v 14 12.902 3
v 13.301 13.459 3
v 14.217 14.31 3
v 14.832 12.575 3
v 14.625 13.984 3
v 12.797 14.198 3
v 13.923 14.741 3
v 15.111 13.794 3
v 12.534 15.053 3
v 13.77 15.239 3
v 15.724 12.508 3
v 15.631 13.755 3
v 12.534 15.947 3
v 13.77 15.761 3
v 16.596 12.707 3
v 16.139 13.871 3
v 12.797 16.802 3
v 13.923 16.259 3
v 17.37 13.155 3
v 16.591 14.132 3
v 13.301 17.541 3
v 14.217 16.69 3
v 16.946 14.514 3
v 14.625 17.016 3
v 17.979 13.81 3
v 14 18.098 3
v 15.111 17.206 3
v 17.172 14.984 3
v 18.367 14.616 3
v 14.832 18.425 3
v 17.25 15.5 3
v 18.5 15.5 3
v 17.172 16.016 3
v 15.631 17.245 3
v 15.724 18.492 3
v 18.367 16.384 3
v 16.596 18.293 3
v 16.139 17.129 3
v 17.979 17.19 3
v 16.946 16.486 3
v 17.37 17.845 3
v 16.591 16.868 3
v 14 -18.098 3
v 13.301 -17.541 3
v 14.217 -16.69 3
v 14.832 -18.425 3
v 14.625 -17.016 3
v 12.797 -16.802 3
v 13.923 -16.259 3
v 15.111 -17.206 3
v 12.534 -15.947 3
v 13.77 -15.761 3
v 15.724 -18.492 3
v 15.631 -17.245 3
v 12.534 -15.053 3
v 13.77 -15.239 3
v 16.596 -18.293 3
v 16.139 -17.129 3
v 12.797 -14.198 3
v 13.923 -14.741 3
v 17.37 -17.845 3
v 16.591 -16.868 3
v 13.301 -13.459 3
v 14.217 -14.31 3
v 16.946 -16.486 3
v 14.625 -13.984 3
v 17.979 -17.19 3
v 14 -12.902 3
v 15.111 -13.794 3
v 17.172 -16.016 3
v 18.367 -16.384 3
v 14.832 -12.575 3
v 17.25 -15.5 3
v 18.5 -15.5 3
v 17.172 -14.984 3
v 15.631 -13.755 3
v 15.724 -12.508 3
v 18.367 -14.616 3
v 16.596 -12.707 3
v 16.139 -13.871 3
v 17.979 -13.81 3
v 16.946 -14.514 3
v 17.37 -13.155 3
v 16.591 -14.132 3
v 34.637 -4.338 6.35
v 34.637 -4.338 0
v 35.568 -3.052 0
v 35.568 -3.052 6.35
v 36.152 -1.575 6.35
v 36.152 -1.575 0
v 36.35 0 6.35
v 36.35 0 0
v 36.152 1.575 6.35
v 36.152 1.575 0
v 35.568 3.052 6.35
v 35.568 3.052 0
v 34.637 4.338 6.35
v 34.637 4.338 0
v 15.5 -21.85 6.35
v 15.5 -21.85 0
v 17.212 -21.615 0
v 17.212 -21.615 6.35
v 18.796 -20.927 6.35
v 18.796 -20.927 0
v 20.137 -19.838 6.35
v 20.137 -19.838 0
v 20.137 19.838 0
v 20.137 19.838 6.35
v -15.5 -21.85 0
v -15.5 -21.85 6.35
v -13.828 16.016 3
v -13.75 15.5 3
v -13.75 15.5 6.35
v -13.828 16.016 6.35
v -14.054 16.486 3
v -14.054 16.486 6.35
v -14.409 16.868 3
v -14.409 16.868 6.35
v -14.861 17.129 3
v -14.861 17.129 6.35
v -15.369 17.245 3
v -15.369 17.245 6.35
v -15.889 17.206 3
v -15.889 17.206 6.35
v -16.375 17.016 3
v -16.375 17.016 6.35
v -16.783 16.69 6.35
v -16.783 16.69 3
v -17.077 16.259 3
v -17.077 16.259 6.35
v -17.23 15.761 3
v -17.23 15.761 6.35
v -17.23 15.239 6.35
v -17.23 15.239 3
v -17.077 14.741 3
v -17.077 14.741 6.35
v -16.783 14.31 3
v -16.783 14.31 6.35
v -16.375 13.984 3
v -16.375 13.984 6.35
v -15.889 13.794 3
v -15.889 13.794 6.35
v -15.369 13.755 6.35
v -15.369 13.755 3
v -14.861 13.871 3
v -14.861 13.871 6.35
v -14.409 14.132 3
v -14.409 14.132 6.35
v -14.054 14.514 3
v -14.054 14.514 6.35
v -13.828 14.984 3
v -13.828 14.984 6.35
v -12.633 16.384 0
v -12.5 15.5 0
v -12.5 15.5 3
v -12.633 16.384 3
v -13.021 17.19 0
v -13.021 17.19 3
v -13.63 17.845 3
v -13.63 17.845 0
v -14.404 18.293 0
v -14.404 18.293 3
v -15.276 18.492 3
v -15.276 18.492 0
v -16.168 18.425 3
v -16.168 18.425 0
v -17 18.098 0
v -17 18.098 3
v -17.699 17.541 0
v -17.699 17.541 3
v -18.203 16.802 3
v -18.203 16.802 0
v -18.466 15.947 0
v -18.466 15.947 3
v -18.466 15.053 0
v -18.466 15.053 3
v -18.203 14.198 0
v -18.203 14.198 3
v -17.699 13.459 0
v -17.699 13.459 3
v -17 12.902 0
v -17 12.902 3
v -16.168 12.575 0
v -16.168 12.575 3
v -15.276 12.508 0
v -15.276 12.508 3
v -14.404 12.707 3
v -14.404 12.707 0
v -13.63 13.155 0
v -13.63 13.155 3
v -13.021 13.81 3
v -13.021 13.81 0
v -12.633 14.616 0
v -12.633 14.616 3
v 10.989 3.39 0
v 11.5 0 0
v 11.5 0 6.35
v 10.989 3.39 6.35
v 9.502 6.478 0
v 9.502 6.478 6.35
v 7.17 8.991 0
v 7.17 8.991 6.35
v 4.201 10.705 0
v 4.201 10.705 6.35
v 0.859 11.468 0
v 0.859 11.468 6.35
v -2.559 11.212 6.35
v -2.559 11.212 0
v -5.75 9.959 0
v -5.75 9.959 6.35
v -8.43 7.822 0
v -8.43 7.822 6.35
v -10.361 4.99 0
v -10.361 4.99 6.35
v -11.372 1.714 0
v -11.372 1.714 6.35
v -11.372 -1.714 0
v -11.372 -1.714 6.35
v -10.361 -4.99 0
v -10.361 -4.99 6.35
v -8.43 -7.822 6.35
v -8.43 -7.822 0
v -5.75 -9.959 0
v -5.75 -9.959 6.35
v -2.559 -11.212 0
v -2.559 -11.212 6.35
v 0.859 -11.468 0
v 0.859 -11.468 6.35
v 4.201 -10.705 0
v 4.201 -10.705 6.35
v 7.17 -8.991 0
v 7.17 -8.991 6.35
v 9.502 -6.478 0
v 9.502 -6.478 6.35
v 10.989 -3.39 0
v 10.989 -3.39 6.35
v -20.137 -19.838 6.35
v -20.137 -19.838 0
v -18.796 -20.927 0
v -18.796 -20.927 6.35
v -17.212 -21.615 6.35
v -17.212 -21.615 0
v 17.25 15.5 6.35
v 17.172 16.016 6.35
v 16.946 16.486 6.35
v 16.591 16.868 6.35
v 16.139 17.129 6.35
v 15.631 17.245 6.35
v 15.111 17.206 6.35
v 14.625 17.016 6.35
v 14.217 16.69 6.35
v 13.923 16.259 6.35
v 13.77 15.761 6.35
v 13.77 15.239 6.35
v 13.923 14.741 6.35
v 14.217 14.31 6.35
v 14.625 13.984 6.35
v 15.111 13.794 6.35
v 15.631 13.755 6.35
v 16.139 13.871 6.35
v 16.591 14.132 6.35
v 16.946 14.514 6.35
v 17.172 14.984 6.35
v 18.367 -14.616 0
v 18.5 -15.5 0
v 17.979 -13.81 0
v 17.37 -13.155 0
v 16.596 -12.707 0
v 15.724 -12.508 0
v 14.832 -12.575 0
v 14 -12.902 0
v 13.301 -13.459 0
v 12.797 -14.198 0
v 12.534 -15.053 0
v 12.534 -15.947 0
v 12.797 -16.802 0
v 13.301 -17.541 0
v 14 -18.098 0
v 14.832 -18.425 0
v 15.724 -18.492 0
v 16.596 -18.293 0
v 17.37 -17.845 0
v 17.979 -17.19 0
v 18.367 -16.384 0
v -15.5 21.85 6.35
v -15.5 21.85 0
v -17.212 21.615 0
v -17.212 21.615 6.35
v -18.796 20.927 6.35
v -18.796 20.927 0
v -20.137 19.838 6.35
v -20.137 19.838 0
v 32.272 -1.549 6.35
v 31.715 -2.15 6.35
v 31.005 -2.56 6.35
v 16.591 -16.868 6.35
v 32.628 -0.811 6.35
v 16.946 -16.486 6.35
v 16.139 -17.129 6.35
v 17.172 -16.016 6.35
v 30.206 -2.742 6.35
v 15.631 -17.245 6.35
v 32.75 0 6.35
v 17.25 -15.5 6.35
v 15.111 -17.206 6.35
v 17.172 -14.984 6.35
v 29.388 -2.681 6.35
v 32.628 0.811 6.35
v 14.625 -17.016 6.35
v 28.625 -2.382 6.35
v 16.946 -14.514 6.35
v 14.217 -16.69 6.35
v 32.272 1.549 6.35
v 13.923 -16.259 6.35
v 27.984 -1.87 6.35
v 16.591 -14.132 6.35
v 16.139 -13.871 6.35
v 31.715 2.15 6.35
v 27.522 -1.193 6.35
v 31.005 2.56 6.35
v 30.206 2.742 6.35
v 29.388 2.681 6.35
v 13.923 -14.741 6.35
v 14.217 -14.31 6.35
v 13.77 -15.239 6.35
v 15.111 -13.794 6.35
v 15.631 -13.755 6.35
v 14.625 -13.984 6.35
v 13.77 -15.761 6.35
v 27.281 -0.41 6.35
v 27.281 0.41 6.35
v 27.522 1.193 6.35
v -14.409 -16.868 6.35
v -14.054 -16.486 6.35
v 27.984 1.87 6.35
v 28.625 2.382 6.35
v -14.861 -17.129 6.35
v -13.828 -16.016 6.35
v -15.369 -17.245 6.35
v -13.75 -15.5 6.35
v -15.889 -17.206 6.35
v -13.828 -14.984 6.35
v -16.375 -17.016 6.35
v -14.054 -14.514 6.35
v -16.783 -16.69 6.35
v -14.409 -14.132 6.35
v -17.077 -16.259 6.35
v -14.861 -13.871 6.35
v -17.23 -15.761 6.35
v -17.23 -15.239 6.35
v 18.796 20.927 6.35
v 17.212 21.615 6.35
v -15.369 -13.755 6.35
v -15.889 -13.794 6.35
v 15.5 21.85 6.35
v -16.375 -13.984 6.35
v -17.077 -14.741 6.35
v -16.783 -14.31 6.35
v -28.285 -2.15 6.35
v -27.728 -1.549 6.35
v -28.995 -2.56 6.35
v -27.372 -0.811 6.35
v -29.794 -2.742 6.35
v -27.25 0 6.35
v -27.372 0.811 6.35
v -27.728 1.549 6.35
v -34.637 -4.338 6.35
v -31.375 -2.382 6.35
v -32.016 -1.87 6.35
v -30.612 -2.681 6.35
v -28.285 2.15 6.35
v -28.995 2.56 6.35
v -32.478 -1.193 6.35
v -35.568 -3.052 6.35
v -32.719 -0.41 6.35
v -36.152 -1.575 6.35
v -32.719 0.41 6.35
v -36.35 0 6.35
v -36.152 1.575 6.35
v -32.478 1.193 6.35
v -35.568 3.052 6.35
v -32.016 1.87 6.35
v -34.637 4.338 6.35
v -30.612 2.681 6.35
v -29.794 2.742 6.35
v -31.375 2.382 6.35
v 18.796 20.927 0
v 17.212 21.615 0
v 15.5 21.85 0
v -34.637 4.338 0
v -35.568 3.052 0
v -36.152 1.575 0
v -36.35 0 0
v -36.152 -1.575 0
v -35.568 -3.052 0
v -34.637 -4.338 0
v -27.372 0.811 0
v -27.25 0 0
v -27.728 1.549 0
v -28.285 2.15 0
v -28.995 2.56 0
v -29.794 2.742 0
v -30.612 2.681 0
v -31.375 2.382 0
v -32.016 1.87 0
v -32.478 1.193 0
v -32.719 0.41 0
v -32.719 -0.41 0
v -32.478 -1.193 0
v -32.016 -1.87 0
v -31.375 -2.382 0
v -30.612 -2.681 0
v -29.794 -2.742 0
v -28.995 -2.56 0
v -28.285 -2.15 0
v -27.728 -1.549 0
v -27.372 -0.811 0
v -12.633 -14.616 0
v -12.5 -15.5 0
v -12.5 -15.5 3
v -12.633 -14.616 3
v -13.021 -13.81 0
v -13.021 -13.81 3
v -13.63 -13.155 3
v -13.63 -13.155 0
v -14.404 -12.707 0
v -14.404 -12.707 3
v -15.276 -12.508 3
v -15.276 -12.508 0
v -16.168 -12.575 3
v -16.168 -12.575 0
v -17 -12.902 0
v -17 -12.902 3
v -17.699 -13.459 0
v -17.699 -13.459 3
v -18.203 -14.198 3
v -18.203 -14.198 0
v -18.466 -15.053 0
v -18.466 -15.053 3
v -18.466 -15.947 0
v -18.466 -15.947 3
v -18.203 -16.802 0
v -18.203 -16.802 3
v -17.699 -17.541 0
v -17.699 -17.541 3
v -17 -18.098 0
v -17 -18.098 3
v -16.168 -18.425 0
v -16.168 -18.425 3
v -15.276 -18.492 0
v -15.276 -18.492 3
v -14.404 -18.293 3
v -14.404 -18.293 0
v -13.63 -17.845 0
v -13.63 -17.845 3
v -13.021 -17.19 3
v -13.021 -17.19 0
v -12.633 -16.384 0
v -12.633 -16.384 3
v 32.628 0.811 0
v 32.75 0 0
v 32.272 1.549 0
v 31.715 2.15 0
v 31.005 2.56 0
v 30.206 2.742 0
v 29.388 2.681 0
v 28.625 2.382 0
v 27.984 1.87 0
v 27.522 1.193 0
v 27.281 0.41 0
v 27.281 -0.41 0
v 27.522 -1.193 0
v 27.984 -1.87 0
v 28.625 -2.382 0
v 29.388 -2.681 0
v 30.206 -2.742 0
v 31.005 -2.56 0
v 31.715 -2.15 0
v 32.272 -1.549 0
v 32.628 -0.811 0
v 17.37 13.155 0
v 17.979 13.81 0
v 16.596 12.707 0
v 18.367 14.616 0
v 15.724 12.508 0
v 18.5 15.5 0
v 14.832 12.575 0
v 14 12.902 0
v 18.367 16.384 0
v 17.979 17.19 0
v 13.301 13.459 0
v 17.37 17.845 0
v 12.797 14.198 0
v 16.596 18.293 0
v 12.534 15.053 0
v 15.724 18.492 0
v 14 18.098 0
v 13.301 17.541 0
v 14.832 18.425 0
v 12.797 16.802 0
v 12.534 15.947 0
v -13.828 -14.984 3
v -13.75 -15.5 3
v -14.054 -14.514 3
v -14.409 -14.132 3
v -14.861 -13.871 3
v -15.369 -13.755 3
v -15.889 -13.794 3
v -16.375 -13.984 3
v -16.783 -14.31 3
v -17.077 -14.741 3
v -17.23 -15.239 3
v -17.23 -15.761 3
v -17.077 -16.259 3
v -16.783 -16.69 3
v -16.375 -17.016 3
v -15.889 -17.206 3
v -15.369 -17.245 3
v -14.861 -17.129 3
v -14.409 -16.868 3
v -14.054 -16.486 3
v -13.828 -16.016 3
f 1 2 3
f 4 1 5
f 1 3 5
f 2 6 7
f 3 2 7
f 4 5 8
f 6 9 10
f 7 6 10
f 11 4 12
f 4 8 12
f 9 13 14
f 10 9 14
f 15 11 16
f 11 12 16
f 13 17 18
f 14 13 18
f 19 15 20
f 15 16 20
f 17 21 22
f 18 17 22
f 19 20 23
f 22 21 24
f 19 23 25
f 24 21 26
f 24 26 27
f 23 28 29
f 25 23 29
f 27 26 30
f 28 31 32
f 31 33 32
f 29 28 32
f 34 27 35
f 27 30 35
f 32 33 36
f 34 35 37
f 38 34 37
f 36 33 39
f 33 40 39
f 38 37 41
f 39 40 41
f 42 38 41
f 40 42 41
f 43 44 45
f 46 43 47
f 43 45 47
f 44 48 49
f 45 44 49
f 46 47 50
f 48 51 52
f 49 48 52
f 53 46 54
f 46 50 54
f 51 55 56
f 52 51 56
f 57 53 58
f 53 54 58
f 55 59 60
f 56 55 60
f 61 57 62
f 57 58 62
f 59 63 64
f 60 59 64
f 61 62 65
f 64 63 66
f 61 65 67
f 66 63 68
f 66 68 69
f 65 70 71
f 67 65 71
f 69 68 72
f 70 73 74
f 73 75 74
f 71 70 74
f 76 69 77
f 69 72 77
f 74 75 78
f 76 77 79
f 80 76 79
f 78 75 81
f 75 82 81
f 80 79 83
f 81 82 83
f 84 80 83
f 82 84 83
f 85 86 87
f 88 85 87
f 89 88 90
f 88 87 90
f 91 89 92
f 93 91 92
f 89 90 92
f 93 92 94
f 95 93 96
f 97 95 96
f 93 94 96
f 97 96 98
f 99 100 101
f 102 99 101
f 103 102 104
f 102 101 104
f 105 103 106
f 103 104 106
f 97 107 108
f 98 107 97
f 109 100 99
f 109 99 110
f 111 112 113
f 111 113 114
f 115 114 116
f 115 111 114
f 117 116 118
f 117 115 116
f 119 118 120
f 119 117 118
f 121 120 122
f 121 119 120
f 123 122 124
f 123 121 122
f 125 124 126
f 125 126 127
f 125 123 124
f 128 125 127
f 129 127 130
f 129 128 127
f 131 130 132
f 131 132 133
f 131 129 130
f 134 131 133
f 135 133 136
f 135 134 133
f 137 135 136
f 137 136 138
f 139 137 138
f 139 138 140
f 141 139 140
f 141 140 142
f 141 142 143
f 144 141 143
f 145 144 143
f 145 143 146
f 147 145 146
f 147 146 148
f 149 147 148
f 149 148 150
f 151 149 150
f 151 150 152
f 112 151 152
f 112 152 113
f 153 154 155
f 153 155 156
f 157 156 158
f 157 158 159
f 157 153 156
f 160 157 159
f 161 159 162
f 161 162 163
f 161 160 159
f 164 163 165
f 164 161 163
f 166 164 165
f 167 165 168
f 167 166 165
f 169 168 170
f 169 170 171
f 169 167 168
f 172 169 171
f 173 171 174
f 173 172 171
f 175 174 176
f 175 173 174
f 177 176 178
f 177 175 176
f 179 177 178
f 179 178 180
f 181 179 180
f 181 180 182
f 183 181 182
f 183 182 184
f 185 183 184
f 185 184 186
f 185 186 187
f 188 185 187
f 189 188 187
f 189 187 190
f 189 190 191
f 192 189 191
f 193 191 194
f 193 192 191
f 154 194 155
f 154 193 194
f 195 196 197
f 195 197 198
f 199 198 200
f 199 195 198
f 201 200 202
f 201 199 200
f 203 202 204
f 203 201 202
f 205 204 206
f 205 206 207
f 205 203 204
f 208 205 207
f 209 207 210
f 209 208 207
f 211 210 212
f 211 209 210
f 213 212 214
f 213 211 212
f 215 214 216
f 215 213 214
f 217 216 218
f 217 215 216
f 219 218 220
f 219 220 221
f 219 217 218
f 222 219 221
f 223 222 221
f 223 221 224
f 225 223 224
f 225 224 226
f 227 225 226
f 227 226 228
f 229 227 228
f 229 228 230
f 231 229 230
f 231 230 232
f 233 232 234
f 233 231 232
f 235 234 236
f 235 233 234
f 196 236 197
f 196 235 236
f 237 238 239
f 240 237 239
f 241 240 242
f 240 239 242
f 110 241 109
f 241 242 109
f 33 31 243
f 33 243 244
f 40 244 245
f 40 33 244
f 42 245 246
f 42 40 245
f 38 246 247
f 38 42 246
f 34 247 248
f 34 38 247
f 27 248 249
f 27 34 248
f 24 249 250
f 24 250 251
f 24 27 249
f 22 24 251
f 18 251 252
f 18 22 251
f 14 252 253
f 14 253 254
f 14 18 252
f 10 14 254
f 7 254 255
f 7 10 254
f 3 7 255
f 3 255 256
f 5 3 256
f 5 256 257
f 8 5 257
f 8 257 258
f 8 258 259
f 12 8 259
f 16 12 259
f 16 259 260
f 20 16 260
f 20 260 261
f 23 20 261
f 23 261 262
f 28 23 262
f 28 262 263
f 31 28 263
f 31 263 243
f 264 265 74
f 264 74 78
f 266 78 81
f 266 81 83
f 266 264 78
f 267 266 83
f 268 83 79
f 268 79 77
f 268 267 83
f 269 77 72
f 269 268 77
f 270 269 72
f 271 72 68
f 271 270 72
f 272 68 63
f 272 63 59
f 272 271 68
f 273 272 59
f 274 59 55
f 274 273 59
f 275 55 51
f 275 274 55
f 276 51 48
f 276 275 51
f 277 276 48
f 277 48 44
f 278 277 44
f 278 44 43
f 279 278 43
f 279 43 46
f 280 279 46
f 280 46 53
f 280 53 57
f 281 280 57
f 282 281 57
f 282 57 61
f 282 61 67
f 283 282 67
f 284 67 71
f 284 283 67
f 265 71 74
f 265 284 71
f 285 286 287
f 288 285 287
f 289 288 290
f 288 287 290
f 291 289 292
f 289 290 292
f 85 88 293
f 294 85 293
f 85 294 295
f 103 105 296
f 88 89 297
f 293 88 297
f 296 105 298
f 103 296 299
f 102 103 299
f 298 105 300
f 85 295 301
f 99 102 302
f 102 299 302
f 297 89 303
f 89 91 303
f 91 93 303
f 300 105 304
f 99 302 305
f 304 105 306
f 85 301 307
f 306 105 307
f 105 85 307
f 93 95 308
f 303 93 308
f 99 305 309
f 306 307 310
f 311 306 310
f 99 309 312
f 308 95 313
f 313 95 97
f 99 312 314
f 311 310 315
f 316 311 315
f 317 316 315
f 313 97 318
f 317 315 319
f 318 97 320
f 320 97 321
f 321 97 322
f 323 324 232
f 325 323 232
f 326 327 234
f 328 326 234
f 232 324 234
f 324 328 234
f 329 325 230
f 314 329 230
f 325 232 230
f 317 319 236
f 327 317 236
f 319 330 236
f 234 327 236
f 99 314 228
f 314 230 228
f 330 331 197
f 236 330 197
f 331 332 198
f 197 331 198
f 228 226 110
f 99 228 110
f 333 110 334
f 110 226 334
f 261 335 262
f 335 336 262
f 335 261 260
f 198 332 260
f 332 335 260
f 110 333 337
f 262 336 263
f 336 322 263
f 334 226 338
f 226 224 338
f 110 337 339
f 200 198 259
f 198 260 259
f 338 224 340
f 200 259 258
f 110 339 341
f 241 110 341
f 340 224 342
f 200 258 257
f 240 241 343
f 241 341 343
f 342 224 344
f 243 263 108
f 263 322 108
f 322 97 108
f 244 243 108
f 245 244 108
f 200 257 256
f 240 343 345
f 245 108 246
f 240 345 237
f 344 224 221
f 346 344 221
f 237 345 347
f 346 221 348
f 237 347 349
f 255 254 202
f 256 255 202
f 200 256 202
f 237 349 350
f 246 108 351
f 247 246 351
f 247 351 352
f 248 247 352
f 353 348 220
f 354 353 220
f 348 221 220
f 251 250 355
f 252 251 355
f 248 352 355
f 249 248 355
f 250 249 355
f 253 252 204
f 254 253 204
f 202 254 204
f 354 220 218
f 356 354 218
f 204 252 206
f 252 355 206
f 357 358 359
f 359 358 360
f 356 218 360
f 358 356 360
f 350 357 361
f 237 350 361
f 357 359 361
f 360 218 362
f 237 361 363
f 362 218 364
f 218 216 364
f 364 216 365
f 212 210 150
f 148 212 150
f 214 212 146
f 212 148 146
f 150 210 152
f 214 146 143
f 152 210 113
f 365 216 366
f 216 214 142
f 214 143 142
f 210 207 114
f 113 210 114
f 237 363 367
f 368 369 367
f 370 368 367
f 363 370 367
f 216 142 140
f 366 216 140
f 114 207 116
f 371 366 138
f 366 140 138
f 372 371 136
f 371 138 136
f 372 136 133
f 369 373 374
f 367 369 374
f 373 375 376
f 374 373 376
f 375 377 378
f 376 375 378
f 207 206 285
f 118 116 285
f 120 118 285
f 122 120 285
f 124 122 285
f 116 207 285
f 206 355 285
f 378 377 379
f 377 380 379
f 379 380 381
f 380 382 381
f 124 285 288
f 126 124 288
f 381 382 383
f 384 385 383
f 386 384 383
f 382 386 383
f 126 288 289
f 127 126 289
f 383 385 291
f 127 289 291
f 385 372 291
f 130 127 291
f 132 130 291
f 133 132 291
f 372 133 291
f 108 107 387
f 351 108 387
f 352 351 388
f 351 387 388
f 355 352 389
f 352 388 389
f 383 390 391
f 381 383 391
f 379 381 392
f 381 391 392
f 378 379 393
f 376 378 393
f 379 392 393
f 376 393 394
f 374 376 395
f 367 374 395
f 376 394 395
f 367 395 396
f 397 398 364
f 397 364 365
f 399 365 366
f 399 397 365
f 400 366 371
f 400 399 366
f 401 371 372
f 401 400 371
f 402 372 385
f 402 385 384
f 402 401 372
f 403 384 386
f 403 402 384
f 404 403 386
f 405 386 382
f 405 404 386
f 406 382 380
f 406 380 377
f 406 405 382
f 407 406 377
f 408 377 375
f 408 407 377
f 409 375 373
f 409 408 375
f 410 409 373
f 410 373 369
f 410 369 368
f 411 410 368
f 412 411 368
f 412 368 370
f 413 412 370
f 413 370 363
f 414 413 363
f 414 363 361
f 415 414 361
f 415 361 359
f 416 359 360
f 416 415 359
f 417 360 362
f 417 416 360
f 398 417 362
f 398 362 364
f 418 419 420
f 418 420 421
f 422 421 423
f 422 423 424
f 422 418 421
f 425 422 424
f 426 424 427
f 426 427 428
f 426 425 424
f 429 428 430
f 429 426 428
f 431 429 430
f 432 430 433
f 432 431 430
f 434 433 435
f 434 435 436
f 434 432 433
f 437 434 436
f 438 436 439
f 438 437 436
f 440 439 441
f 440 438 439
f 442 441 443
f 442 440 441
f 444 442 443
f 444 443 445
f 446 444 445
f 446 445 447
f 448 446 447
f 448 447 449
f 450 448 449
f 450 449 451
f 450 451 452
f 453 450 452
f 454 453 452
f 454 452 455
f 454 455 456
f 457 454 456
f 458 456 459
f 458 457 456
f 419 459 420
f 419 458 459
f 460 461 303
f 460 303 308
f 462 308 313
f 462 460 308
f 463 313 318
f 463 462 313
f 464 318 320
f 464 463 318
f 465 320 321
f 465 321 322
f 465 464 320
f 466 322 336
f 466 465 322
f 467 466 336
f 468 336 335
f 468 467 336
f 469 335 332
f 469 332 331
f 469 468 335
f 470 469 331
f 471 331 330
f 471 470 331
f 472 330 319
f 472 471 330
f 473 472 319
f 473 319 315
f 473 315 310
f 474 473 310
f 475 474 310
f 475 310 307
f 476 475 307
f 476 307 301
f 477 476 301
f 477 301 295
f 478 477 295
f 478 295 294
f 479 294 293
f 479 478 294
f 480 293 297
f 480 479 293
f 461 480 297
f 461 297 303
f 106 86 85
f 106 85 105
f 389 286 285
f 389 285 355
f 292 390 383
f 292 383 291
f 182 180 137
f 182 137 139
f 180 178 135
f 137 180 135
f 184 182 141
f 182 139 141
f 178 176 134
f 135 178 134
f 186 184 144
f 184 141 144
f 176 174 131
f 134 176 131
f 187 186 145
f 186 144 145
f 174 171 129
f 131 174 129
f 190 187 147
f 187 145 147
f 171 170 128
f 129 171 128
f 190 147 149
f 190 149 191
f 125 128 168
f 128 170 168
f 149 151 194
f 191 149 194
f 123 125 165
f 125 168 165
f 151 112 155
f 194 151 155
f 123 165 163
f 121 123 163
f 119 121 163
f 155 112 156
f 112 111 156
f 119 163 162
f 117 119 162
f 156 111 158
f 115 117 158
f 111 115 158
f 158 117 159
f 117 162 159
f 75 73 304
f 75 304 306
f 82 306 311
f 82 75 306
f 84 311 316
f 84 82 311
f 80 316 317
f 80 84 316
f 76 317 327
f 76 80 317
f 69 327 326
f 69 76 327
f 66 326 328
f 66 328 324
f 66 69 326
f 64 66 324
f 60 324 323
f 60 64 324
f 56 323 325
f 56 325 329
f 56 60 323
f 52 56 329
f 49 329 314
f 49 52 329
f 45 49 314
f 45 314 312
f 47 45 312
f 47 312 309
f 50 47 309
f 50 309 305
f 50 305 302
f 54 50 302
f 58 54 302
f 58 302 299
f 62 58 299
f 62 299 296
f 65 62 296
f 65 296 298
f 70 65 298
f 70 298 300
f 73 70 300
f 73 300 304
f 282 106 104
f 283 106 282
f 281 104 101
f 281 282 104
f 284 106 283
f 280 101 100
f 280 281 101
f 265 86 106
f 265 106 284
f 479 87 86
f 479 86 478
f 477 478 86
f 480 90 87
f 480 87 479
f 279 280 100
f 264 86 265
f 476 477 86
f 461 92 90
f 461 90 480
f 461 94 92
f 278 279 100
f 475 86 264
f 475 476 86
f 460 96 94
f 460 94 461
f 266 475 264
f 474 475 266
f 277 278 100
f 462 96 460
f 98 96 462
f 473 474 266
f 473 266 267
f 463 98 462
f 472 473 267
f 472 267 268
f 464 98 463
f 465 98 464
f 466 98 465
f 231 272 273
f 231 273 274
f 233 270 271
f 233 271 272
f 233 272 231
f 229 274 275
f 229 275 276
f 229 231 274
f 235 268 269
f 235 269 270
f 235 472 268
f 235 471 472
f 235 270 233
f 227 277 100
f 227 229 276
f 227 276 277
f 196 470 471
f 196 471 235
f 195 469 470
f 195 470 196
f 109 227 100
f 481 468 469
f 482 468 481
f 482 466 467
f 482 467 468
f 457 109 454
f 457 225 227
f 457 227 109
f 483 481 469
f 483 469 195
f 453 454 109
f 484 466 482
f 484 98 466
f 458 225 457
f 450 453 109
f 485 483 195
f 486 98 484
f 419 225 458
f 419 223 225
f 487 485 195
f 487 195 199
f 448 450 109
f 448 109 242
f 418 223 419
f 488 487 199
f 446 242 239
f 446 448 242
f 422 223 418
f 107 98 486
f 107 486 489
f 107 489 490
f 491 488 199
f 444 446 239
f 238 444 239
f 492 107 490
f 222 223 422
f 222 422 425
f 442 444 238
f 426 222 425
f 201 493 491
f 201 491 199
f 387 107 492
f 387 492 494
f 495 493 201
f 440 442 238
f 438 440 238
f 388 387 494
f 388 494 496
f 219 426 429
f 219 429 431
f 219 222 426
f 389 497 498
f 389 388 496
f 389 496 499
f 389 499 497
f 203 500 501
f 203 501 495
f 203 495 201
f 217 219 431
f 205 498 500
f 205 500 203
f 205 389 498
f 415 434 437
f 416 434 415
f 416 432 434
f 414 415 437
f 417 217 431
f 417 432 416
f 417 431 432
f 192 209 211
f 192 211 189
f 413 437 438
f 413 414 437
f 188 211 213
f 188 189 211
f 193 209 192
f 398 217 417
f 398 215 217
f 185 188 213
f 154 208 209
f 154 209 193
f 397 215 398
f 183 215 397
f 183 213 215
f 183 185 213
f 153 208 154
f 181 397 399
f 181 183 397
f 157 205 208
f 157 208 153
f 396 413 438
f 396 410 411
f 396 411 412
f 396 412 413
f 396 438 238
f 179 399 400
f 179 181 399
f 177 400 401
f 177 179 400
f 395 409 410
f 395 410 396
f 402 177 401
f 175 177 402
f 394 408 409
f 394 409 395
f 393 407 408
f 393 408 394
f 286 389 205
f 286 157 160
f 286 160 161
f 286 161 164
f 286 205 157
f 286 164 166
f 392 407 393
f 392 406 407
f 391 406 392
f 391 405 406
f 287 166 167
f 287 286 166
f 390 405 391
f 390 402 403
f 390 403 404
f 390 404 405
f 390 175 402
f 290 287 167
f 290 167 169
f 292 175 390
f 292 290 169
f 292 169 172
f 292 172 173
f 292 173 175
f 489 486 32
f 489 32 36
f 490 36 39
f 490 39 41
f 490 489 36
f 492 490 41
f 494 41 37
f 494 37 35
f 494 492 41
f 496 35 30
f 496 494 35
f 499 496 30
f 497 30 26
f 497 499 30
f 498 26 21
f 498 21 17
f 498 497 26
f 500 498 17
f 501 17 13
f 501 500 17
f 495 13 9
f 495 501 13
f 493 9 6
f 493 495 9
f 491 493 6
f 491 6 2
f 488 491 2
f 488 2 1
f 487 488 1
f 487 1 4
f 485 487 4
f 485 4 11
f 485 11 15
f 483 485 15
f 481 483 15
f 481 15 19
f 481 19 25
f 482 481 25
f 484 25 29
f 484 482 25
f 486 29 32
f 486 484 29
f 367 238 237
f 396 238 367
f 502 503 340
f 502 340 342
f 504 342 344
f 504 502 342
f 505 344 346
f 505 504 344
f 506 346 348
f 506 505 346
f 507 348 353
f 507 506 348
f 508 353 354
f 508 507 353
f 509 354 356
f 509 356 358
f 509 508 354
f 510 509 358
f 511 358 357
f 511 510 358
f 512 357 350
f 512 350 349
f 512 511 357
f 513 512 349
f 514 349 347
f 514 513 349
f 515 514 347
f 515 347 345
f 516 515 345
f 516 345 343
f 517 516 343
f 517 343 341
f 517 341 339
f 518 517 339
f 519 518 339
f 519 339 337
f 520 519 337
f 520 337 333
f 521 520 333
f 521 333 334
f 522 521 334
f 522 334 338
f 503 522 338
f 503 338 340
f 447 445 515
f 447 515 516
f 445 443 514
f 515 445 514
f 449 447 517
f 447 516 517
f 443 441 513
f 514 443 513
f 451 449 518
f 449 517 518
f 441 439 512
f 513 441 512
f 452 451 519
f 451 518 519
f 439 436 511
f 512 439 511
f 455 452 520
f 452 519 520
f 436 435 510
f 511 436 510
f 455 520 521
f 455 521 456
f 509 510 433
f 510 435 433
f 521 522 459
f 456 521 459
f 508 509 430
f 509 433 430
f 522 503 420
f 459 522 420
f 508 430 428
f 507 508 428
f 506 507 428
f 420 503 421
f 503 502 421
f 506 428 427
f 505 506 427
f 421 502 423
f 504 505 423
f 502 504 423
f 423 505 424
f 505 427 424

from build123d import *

# Parameters (mm, degrees)
SKETCH093_R     = 1.75
SKETCH093_R_2   = 2.75
SKETCH093_R_3   = 11.5
PAD032_DEPTH    = 6.35
SKETCH094_R     = 3
POCKET027_DEPTH = 3


with BuildPart() as part:
    # Sketch093 → Pad032 (new body)
    with BuildSketch(Plane.XY):
        with BuildLine():
            Line((-34.637223, 4.338048), (-20.137223, 19.838048))
            ThreePointArc((-15.5, 21.85), (-18.027439, 21.325337), (-20.137223, 19.838048))
            Line((-15.5, 21.85), (15.5, 21.85))
            ThreePointArc((20.137223, 19.838048), (18.027439, 21.325337), (15.5, 21.85))
            Line((20.137223, 19.838048), (34.637223, 4.338048))
            ThreePointArc((34.637223, -4.338048), (36.35, 0), (34.637223, 4.338048))
            Line((34.637223, -4.338048), (20.137223, -19.838048))
            ThreePointArc((15.5, -21.85), (18.027439, -21.325337), (20.137223, -19.838048))
            Line((15.5, -21.85), (-15.5, -21.85))
            ThreePointArc((-20.137223, -19.838048), (-18.027439, -21.325337), (-15.5, -21.85))
            Line((-20.137223, -19.838048), (-34.637223, -4.338048))
            ThreePointArc((-34.637223, 4.338048), (-36.35, 0), (-34.637223, -4.338048))
        make_face()
        with Locations((-15.5, 15.5)):
            Circle(SKETCH093_R, mode=Mode.SUBTRACT)
        with Locations((15.5, 15.5)):
            Circle(SKETCH093_R, mode=Mode.SUBTRACT)
        with Locations((15.5, -15.5)):
            Circle(SKETCH093_R, mode=Mode.SUBTRACT)
        with Locations((-15.5, -15.5)):
            Circle(SKETCH093_R, mode=Mode.SUBTRACT)
        with Locations((-30, 0)):
            Circle(SKETCH093_R_2, mode=Mode.SUBTRACT)
        with Locations((30, 0)):
            Circle(SKETCH093_R_2, mode=Mode.SUBTRACT)
        Circle(SKETCH093_R_3, mode=Mode.SUBTRACT)
    extrude(amount=PAD032_DEPTH)

    # Sketch094 → Pocket027 (cut)
    with BuildSketch(Plane.XY):
        with Locations((-15.5, 15.5)):
            Circle(SKETCH094_R)
        with Locations((15.5, 15.5)):
            Circle(SKETCH094_R)
        with Locations((15.5, -15.5)):
            Circle(SKETCH094_R)
        with Locations((-15.5, -15.5)):
            Circle(SKETCH094_R)
    extrude(amount=POCKET027_DEPTH, mode=Mode.SUBTRACT)


solid = part.part
